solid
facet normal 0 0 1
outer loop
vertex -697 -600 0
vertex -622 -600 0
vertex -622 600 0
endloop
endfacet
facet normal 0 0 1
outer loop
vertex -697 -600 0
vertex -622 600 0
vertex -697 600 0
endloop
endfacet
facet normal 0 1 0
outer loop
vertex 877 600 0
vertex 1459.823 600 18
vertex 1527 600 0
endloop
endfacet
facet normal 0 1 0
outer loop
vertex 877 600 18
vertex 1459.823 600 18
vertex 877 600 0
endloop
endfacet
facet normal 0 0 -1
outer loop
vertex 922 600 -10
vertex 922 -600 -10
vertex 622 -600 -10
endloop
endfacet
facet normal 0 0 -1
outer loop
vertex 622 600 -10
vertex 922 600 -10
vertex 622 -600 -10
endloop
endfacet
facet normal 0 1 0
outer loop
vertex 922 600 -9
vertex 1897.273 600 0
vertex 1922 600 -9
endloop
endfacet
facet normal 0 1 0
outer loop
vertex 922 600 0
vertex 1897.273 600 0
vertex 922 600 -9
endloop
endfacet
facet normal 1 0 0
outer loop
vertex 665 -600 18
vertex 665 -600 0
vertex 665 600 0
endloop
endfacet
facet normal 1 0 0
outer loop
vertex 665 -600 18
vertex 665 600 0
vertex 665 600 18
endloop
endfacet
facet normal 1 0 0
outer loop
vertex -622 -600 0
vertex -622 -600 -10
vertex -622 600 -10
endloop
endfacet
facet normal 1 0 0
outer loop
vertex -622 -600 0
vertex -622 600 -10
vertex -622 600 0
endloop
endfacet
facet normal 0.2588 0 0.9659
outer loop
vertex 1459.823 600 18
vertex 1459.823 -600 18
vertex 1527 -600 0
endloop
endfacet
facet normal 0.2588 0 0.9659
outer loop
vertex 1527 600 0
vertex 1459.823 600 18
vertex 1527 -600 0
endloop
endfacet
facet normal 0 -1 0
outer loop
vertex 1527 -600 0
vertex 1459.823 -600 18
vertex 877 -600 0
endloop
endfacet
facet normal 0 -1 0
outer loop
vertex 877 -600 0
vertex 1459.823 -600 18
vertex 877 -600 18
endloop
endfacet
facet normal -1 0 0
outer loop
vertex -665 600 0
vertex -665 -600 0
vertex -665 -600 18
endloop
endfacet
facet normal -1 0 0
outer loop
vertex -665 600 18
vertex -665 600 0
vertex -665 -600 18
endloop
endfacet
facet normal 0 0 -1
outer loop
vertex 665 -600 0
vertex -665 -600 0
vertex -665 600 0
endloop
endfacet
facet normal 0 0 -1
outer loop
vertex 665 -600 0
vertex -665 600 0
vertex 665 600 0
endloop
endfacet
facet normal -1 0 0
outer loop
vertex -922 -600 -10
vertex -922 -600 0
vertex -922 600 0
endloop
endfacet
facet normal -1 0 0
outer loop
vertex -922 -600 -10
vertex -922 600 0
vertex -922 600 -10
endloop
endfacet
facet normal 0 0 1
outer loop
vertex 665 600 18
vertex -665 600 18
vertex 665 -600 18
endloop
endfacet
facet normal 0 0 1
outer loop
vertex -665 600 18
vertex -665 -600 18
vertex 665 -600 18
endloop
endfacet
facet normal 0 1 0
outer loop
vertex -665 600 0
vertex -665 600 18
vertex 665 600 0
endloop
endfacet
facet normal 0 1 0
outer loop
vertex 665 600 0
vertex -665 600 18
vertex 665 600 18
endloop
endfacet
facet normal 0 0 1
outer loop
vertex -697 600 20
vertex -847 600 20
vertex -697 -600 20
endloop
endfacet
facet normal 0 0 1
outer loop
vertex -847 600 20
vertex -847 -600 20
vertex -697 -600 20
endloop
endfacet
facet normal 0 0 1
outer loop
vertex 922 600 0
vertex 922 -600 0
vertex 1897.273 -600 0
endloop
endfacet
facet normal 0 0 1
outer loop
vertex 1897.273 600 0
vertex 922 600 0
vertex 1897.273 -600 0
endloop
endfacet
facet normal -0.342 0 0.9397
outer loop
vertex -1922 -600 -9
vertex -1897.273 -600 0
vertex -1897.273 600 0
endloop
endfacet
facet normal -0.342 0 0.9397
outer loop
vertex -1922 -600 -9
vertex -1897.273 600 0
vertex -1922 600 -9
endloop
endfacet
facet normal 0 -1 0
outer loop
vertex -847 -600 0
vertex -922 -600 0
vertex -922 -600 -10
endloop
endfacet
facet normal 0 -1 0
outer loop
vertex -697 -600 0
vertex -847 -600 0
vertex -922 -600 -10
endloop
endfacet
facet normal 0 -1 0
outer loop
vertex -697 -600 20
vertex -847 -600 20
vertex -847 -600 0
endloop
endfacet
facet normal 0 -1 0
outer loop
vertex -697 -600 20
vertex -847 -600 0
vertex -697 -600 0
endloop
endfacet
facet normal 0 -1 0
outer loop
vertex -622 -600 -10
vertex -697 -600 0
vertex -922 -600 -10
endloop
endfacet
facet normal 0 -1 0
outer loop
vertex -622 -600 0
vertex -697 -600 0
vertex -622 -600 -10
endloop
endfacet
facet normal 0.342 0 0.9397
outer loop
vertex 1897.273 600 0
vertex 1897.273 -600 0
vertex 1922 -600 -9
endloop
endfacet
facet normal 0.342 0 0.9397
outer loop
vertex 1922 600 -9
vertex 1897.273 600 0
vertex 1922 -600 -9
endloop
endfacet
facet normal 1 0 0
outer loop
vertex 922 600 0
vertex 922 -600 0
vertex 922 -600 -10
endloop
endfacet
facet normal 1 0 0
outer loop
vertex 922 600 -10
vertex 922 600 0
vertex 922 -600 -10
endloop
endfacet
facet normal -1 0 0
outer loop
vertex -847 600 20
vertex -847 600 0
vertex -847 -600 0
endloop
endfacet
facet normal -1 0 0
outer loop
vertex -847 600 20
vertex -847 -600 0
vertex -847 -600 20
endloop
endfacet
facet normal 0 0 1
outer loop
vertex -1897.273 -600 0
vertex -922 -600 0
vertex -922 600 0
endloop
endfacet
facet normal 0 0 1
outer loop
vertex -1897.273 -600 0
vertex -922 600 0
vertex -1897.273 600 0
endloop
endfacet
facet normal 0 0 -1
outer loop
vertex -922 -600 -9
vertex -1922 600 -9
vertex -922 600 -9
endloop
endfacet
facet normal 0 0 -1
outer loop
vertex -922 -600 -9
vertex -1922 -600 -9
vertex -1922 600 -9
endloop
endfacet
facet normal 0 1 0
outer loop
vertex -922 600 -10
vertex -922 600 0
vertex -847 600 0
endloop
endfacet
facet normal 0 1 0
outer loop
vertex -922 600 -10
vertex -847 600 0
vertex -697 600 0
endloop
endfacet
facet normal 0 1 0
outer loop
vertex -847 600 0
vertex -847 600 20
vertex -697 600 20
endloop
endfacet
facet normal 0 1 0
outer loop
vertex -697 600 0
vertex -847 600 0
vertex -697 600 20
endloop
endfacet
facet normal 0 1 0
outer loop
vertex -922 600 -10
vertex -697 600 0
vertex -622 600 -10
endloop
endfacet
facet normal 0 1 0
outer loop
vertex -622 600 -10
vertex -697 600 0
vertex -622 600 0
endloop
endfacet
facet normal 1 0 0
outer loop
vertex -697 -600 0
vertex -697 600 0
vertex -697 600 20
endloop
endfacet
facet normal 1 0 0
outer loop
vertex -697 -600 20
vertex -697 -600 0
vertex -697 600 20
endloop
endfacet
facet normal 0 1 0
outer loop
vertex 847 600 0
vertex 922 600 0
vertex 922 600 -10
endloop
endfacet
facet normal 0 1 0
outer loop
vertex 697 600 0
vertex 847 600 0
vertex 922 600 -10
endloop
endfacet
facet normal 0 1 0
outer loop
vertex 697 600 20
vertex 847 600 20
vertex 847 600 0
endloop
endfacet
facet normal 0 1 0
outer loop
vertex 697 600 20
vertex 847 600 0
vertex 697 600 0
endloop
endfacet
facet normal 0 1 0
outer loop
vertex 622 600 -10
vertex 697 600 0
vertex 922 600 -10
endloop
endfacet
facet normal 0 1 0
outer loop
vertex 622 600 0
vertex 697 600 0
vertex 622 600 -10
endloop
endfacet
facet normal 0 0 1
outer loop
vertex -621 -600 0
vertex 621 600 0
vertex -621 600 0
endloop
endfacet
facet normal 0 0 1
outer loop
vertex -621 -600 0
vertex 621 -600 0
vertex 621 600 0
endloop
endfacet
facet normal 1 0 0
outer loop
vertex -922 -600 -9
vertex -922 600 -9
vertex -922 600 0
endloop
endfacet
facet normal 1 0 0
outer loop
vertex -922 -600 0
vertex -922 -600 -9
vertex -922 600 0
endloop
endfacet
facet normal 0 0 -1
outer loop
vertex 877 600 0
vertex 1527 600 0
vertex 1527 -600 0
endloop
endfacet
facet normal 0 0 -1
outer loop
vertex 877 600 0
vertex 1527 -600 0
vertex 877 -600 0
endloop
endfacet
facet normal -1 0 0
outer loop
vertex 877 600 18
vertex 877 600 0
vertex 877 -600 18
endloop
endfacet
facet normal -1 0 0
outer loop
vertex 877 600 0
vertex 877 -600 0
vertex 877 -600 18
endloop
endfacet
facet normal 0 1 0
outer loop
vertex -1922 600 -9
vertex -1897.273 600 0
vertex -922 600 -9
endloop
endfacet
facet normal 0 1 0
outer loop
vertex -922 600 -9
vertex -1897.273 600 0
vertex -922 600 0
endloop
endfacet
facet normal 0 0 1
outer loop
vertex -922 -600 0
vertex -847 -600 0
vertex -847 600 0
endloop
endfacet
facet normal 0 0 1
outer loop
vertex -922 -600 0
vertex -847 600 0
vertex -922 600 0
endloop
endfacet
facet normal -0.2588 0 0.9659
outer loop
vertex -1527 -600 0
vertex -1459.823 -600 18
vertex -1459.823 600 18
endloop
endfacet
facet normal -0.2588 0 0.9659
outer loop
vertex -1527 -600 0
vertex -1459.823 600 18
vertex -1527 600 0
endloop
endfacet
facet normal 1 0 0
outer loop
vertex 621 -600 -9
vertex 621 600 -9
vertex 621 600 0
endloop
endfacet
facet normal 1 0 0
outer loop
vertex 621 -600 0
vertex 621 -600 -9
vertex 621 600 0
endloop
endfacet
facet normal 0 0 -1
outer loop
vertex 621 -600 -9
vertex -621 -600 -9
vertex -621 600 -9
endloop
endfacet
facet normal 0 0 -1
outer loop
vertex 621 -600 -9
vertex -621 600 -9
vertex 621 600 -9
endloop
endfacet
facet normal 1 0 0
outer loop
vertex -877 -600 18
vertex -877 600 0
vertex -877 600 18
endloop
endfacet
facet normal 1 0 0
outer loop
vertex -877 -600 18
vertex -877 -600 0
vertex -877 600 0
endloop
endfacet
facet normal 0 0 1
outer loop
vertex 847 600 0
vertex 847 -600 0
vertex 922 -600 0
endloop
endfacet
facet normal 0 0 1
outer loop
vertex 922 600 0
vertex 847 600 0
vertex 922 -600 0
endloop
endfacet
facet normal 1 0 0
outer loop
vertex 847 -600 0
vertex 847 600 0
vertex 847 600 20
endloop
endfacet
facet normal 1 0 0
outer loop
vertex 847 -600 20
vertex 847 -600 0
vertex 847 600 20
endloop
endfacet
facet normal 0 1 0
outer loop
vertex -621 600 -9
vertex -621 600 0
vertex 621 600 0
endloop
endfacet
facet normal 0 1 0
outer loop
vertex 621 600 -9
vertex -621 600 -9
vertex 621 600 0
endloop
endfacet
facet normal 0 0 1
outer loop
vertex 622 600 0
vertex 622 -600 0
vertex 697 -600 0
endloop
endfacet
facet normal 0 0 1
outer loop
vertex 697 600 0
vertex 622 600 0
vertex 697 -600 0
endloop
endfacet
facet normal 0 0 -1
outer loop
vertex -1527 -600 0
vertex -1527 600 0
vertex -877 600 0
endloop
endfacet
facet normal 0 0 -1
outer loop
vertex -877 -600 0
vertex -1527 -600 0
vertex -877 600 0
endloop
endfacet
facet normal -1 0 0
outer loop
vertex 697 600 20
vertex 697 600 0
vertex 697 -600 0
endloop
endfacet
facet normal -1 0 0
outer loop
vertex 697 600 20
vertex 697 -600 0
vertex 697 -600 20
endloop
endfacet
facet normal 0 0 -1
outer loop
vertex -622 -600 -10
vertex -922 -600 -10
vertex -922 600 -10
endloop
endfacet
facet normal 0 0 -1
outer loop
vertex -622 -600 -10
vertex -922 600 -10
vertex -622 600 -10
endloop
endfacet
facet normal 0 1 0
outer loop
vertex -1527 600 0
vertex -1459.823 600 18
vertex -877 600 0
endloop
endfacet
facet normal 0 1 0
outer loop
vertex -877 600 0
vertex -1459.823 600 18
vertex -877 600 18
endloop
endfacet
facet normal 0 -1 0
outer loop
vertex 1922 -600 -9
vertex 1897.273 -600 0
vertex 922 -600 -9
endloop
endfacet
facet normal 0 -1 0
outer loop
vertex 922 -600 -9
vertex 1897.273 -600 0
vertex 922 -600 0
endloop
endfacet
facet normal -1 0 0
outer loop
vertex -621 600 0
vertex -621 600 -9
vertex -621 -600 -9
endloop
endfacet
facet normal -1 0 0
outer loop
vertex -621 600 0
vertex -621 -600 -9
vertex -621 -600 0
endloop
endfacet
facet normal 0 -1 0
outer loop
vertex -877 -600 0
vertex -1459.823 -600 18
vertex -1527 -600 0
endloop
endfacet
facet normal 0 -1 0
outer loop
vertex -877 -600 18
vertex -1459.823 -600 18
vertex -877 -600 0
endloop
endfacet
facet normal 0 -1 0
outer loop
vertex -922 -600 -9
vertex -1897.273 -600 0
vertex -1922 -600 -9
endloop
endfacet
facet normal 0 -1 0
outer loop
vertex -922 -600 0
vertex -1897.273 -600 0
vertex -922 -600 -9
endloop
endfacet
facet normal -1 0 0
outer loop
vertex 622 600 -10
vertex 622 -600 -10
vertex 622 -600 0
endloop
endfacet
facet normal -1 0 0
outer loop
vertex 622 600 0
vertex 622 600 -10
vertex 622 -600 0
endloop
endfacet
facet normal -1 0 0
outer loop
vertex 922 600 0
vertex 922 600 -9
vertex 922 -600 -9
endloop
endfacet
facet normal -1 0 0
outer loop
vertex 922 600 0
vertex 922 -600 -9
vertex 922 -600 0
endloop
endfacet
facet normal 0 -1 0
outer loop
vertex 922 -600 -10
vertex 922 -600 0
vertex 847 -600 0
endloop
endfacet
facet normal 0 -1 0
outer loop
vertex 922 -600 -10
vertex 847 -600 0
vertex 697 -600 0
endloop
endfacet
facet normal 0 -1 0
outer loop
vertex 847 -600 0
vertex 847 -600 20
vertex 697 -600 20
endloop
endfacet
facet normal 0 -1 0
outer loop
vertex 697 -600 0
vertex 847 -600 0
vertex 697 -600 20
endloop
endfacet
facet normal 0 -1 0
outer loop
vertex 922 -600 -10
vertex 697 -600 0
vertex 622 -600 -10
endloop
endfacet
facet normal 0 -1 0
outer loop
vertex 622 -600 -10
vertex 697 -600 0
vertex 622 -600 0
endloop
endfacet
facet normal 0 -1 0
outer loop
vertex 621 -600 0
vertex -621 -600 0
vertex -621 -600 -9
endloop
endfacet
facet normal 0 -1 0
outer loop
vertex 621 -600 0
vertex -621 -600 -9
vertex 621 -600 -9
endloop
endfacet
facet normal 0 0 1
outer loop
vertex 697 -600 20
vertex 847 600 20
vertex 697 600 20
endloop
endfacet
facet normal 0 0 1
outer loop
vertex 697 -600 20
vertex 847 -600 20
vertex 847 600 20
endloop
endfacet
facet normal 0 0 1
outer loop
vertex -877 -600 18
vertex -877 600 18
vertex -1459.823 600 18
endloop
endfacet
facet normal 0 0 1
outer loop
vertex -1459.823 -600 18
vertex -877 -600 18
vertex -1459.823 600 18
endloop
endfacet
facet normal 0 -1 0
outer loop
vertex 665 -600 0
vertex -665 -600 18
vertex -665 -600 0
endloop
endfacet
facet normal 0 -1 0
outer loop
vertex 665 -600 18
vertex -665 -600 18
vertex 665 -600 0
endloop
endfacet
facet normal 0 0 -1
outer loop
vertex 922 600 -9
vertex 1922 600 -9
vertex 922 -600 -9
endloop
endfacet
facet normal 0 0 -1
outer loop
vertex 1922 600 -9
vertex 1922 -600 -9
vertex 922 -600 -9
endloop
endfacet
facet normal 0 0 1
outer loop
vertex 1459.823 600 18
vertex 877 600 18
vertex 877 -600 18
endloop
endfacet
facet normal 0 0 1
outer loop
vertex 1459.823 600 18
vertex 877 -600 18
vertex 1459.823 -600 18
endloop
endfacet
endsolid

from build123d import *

# Parameters (mm, degrees)
F0_W      = 150
F0_H      = 20
F1_DEPTH  = 600
F3_W      = 621
F3_H      = 9
F4_DEPTH  = 600
F5_DEPTH  = 600
F7_DEPTH  = 600
F9_DEPTH  = 600
F12_W     = 1330
F12_H     = 18
F13_DEPTH = 600


with BuildPart() as f1:
    # F0 (on Front) → F1 (new body, symmetric)
    with BuildSketch(Plane.XZ):
        with Locations((-772, 10)):
            Rectangle(F0_W, F0_H)
        Polygon((-697, 0), (-847, 0), (-922, 0), (-922, -10), (-622, -10), (-622, 0), align=None)
    extrude(amount=F1_DEPTH, both=True)


with BuildPart() as f2_1:
    # F2: instance of F1
    add(f1.part.mirror(Plane.YZ))


with BuildPart() as f4:
    # F3 (on Front) → F4 (new body, symmetric)
    with BuildSketch(Plane.XZ):
        with Locations((-310.5, -4.5)):
            Rectangle(F3_W, F3_H)
        with Locations((310.5, -4.5)):
            Rectangle(F3_W, F3_H)
    extrude(amount=F4_DEPTH, both=True)


with BuildPart() as f5:
    # F3 (on Front) → F5 (new body, symmetric)
    with BuildSketch(Plane.XZ):
        with Locations((-310.5, -4.5)):
            Rectangle(F3_W, F3_H)
        with Locations((310.5, -4.5)):
            Rectangle(F3_W, F3_H)
    extrude(amount=F5_DEPTH, both=True)


with BuildPart() as f7:
    # F6 (on Front) → F7 (new body, symmetric)
    with BuildSketch(Plane.XZ):
        Polygon((-922, -9), (-922, 0), (-1897.272703, 0), (-1922, -9), align=None)
    extrude(amount=F7_DEPTH, both=True)


with BuildPart() as f9:
    # F8 (on Front) → F9 (new body, symmetric)
    with BuildSketch(Plane.XZ):
        Polygon((-877, 0), (-877, 18), (-1459.823085, 18), (-1527, 0), align=None)
    extrude(amount=F9_DEPTH, both=True)


with BuildPart() as f10_1:
    # F10: instance of F9
    add(f9.part.mirror(Plane.YZ))


with BuildPart() as f10_2:
    # F10: instance of F7
    add(f7.part.mirror(Plane.YZ))


with BuildPart() as f13:
    # F12 (on Front) → F13 (new body, symmetric)
    with BuildSketch(Plane.XZ):
        with Locations((0, 9)):
            Rectangle(F12_W, F12_H)
    extrude(amount=F13_DEPTH, both=True)


solid = Compound([f1.part, f2_1.part, f4.part, f7.part, f9.part, f10_1.part, f10_2.part, f13.part])
